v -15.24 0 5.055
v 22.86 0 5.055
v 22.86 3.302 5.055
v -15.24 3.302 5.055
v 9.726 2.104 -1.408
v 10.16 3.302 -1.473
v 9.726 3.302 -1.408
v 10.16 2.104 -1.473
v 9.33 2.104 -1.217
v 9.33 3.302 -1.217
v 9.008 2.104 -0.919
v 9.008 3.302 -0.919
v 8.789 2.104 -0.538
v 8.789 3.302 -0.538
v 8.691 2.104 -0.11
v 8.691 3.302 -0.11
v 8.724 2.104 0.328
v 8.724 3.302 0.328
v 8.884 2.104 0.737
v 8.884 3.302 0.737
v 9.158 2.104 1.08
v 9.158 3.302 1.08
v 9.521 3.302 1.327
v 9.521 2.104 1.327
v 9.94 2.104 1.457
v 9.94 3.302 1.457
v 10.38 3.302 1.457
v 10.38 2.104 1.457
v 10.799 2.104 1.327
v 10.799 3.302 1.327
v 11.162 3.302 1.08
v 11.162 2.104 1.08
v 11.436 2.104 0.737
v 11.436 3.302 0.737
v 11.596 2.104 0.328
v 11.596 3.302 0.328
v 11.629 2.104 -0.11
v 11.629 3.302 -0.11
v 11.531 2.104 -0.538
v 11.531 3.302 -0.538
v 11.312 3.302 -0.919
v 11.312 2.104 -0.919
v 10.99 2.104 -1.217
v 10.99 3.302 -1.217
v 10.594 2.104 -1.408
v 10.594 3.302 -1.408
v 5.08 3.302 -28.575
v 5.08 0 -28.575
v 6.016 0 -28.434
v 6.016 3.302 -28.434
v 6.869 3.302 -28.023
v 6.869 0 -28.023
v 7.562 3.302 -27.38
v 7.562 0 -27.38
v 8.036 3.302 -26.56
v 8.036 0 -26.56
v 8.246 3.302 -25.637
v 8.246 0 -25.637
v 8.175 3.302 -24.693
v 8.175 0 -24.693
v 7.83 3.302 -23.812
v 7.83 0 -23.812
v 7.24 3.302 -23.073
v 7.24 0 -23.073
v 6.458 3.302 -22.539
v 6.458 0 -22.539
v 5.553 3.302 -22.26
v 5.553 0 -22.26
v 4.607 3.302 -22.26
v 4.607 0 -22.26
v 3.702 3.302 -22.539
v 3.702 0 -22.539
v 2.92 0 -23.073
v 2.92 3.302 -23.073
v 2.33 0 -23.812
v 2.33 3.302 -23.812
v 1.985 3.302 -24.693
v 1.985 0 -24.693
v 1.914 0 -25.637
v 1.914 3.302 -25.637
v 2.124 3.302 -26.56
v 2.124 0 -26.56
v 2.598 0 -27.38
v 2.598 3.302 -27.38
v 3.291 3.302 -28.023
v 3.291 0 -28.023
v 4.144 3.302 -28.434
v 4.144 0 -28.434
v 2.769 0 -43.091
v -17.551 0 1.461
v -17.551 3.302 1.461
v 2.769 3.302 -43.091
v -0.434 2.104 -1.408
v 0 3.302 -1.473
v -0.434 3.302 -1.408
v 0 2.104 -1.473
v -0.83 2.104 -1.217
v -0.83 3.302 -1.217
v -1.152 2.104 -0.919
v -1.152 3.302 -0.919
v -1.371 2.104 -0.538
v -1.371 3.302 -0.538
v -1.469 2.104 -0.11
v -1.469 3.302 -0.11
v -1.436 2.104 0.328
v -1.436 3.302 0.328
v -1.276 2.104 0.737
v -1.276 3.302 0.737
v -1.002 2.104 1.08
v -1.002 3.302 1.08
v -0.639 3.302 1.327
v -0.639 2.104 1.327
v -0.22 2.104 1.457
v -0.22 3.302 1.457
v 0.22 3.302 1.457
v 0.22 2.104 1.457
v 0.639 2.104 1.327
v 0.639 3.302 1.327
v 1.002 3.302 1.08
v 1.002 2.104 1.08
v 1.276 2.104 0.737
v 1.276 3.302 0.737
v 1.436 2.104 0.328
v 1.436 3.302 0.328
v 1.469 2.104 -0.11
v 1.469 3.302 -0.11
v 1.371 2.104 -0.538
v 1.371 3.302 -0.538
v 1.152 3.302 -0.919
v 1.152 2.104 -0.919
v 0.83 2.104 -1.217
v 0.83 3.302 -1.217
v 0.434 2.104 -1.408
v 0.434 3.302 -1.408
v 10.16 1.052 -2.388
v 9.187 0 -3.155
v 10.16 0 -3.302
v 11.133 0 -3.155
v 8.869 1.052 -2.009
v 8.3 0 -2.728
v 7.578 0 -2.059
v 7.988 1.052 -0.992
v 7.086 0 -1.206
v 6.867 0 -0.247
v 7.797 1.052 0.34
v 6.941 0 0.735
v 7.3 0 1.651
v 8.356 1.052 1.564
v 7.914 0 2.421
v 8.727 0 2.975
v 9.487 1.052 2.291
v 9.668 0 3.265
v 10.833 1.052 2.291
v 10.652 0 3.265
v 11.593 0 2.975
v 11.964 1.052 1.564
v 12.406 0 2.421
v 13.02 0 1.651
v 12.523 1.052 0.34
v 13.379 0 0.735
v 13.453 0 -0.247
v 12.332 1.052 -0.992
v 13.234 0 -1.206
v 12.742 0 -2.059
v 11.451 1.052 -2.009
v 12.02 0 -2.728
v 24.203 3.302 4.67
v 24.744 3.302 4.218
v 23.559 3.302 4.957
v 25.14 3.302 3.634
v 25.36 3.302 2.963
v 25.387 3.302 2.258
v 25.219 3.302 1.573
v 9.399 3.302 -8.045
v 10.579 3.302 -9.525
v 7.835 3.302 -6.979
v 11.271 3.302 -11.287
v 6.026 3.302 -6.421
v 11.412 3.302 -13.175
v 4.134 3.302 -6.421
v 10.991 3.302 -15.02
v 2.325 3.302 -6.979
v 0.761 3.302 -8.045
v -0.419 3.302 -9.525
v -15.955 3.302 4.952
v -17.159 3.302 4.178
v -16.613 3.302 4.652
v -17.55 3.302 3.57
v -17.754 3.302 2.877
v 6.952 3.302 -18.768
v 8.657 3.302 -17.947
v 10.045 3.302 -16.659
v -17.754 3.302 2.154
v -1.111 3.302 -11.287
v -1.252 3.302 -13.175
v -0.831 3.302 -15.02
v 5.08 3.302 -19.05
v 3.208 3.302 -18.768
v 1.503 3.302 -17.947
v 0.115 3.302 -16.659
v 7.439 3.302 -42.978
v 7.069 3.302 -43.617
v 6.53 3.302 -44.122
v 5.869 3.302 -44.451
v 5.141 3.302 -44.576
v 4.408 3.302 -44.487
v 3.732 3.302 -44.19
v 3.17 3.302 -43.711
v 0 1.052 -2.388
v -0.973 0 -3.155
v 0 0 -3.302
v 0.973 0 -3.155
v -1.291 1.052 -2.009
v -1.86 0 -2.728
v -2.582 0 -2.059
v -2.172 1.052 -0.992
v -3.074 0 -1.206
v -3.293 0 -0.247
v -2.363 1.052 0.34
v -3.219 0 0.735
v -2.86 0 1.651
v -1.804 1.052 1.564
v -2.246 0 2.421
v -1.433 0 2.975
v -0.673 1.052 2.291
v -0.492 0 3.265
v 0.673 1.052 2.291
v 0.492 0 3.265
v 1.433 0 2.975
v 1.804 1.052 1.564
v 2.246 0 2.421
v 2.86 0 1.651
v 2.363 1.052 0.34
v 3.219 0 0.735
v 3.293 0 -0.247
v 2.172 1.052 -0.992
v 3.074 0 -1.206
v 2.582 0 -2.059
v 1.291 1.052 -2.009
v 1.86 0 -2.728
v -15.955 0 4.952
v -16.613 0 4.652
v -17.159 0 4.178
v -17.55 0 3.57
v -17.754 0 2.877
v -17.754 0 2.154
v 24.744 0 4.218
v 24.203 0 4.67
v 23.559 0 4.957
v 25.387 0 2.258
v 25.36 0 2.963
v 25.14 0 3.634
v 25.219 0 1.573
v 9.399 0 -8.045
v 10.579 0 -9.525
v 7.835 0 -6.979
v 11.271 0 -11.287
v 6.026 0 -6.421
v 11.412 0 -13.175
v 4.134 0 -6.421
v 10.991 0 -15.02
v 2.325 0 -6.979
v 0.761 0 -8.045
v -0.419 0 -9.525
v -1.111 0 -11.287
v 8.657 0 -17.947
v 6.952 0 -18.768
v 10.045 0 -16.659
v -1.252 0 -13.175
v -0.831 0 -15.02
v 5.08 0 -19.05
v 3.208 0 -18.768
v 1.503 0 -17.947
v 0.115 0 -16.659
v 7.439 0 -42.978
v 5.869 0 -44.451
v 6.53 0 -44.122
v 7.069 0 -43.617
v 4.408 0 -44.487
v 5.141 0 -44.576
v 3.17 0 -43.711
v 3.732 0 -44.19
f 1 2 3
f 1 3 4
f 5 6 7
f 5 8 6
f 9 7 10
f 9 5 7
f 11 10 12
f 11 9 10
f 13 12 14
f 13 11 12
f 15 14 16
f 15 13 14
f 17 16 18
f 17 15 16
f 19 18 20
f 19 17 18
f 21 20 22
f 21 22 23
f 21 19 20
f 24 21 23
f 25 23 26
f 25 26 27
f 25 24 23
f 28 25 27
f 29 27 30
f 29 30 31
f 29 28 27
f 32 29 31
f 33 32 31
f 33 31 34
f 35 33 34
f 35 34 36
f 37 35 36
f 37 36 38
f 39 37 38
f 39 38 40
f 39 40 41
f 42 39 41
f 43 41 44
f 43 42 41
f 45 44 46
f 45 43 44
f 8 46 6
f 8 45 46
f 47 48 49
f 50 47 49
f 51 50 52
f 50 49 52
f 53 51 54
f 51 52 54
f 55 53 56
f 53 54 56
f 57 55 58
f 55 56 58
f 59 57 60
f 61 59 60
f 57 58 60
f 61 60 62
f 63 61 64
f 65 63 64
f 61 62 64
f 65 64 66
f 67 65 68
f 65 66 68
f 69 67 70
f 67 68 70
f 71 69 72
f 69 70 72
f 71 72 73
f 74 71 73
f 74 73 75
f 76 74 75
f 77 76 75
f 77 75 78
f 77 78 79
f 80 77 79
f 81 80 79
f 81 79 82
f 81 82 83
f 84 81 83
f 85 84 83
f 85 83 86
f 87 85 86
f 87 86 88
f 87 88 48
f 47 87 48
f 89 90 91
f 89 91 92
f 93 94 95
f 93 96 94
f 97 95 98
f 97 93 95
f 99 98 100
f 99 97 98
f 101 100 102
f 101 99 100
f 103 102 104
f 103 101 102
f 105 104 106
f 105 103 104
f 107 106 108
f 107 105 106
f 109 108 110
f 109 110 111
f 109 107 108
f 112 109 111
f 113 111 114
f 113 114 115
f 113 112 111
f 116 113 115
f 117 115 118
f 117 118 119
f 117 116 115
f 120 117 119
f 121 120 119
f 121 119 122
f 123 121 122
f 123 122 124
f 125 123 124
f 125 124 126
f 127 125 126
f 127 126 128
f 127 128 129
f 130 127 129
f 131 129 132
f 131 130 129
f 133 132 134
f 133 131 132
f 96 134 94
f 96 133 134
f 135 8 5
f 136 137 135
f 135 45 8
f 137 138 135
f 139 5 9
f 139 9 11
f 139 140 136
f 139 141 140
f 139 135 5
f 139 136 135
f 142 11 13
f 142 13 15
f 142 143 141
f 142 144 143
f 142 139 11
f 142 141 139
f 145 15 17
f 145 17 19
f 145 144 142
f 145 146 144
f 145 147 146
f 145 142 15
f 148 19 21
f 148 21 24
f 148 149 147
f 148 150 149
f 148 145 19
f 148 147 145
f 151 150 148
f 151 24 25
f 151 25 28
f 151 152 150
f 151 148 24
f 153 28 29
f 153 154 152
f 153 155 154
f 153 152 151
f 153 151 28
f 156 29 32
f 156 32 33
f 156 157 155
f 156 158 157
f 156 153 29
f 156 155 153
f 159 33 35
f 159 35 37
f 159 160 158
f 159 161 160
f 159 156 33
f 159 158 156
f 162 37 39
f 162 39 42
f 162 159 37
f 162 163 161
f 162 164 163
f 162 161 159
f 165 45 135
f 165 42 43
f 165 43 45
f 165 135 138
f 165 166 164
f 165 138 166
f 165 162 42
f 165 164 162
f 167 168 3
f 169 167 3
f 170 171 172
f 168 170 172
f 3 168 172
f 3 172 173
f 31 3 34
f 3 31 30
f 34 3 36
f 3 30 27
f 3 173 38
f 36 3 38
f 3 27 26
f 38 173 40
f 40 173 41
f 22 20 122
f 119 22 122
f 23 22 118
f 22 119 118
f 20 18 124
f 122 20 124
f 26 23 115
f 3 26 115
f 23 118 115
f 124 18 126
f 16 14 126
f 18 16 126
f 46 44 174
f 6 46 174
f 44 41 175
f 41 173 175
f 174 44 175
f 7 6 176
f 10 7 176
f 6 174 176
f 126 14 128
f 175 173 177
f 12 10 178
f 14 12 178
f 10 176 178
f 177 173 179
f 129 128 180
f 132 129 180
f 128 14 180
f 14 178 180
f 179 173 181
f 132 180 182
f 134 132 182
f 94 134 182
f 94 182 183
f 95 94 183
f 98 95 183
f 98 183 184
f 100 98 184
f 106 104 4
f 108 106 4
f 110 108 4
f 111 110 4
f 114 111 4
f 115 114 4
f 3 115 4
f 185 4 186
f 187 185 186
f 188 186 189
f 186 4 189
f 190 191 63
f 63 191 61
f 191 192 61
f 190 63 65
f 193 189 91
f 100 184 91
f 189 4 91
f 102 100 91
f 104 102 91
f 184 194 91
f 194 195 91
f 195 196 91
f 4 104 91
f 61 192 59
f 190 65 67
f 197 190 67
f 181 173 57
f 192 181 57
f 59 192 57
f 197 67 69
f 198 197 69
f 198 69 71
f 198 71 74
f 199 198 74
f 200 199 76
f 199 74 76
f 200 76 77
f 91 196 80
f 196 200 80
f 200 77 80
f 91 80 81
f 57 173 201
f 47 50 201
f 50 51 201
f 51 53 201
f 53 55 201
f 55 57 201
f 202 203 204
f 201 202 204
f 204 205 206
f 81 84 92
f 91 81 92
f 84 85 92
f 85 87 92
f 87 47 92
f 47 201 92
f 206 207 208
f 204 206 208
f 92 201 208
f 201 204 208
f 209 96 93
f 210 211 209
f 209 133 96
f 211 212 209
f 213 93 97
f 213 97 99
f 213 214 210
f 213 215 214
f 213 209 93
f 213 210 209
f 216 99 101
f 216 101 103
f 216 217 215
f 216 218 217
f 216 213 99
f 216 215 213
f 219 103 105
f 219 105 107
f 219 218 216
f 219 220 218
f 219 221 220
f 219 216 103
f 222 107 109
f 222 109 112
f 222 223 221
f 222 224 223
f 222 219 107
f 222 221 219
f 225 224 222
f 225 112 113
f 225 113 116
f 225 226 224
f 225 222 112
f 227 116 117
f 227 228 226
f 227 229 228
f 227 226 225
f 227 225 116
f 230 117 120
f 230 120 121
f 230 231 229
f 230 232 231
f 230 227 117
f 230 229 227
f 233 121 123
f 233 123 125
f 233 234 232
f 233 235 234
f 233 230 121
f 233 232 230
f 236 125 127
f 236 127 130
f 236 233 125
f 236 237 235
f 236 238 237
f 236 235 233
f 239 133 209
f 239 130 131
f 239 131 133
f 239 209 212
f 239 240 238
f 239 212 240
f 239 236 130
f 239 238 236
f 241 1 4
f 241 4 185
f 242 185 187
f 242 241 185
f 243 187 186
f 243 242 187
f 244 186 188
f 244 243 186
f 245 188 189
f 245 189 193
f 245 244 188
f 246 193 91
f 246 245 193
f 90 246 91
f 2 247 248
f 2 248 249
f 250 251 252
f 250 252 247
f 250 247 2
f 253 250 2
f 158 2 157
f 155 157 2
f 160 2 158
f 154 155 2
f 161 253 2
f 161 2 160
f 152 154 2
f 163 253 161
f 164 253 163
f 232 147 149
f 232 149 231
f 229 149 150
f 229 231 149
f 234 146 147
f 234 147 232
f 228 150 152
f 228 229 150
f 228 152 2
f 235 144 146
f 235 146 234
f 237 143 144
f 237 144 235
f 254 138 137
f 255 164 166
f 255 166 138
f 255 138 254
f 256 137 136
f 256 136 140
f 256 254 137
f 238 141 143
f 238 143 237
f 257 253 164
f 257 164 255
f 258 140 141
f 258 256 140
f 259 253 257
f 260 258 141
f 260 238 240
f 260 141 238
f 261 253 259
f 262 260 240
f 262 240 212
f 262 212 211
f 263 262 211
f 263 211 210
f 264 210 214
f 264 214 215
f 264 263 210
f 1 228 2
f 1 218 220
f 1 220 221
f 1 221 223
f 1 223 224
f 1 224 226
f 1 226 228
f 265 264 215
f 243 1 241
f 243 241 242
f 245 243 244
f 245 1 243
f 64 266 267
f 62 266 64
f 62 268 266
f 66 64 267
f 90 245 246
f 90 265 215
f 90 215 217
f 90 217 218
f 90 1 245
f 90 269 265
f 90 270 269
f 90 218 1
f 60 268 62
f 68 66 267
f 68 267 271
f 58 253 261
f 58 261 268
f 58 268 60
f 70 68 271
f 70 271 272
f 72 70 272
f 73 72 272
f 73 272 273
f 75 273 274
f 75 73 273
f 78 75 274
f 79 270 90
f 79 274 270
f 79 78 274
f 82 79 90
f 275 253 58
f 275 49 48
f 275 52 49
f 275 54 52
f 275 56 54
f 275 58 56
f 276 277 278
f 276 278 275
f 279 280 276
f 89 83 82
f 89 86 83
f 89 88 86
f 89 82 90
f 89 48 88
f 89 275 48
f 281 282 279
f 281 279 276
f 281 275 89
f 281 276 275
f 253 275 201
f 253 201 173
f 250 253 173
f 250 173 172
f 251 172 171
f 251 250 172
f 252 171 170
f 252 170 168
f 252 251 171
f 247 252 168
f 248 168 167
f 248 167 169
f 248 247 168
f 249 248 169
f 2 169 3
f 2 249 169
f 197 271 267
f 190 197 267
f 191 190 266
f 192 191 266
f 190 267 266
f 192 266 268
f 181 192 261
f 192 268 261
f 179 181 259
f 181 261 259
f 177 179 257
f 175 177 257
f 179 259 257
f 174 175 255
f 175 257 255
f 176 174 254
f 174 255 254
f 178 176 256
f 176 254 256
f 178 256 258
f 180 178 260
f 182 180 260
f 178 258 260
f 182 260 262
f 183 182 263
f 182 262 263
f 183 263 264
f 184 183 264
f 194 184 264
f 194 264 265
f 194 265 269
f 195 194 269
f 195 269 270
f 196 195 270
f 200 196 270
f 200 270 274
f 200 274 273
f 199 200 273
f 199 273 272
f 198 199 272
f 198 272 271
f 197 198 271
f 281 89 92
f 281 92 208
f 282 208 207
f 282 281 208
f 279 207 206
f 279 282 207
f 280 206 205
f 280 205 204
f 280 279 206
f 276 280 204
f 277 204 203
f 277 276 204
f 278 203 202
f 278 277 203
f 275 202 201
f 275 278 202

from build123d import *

# Parameters (mm, degrees)
SKETCH1_R                      = 1.1303
BOSS_EXTRUDE1_DEPTH            = 3.302
F_4_CLEARANCE_HOLE1_AT_2_COUNT = 2
F_4_CLEARANCE_HOLE1_AT_2_PITCH = 10.16
SKETCH17_R                     = 6.35
CUT_EXTRUDE1_DEPTH             = 52.411789825
SKETCH18_R                     = 3.175
CUT_EXTRUDE2_DEPTH             = 52.411789825


with BuildPart() as part:
    # Sketch1 → Boss-Extrude1 (new body)
    with BuildSketch(Plane(origin=(0, 0, 0), x_dir=(1, 0, 0), z_dir=(0, 1, 0))):
        with BuildLine():
            Line((7.439072116, 42.978476899), (25.219072116, -1.573123101))
            ThreePointArc((25.219072116, -1.573123101), (24.962730525, -3.939424318), (22.86, -5.0546))
            Line((22.86, -5.0546), (-15.24, -5.0546))
            ThreePointArc((-15.24, -5.0546), (-17.37645185, -3.888344332), (-17.550975292, -1.460563379))
            Line((-17.550975292, -1.460563379), (2.769024708, 43.091036621))
            ThreePointArc((2.769024708, 43.091036621), (5.141202523, 44.576262541), (7.439072116, 42.978476899))
        make_face()
        with Locations(Location((0, 0, 0), (0, 0, 90))):
            Circle(SKETCH1_R, mode=Mode.SUBTRACT)
        with Locations(Location((10.16, 0, 0), (0, 0, 90))):
            Circle(SKETCH1_R, mode=Mode.SUBTRACT)
    extrude(amount=BOSS_EXTRUDE1_DEPTH)

    # Sketch16 → #4 Clearance Hole1 (revolve, cut)
    with BuildSketch(Plane(origin=(0, 0, 0), x_dir=(0, 0, -1), z_dir=(1, 0, 0))):
        Polygon((0, 0), (0, 3.302), (1.4732, 3.302), (1.4732, 2.103793743), (3.302, 0), align=None)
    f_4_clearance_hole1 = revolve(axis=Axis((0, -6.35, 0), (0, 1, 0)), mode=Mode.SUBTRACT)

    # #4 Clearance Hole1 at 2: #4 Clearance Hole1 ×2
    with Locations(*[(i * F_4_CLEARANCE_HOLE1_AT_2_PITCH, 0, 0) for i in range(1, F_4_CLEARANCE_HOLE1_AT_2_COUNT)]):
        add(f_4_clearance_hole1, mode=Mode.SUBTRACT)

    # Sketch17 → Cut-Extrude1 (cut, through all)
    with BuildSketch(Plane.XZ):
        with Locations(Location((5.08, -12.7, 0), (0, 0, 270))):
            Circle(SKETCH17_R)
    extrude(amount=-CUT_EXTRUDE1_DEPTH, mode=Mode.SUBTRACT)

    # Sketch18 → Cut-Extrude2 (cut, through all)
    with BuildSketch(Plane.XZ):
        with Locations(Location((5.08, -25.4, 0), (0, 0, 270))):
            Circle(SKETCH18_R)
    extrude(amount=-CUT_EXTRUDE2_DEPTH, mode=Mode.SUBTRACT)


solid = part.part
